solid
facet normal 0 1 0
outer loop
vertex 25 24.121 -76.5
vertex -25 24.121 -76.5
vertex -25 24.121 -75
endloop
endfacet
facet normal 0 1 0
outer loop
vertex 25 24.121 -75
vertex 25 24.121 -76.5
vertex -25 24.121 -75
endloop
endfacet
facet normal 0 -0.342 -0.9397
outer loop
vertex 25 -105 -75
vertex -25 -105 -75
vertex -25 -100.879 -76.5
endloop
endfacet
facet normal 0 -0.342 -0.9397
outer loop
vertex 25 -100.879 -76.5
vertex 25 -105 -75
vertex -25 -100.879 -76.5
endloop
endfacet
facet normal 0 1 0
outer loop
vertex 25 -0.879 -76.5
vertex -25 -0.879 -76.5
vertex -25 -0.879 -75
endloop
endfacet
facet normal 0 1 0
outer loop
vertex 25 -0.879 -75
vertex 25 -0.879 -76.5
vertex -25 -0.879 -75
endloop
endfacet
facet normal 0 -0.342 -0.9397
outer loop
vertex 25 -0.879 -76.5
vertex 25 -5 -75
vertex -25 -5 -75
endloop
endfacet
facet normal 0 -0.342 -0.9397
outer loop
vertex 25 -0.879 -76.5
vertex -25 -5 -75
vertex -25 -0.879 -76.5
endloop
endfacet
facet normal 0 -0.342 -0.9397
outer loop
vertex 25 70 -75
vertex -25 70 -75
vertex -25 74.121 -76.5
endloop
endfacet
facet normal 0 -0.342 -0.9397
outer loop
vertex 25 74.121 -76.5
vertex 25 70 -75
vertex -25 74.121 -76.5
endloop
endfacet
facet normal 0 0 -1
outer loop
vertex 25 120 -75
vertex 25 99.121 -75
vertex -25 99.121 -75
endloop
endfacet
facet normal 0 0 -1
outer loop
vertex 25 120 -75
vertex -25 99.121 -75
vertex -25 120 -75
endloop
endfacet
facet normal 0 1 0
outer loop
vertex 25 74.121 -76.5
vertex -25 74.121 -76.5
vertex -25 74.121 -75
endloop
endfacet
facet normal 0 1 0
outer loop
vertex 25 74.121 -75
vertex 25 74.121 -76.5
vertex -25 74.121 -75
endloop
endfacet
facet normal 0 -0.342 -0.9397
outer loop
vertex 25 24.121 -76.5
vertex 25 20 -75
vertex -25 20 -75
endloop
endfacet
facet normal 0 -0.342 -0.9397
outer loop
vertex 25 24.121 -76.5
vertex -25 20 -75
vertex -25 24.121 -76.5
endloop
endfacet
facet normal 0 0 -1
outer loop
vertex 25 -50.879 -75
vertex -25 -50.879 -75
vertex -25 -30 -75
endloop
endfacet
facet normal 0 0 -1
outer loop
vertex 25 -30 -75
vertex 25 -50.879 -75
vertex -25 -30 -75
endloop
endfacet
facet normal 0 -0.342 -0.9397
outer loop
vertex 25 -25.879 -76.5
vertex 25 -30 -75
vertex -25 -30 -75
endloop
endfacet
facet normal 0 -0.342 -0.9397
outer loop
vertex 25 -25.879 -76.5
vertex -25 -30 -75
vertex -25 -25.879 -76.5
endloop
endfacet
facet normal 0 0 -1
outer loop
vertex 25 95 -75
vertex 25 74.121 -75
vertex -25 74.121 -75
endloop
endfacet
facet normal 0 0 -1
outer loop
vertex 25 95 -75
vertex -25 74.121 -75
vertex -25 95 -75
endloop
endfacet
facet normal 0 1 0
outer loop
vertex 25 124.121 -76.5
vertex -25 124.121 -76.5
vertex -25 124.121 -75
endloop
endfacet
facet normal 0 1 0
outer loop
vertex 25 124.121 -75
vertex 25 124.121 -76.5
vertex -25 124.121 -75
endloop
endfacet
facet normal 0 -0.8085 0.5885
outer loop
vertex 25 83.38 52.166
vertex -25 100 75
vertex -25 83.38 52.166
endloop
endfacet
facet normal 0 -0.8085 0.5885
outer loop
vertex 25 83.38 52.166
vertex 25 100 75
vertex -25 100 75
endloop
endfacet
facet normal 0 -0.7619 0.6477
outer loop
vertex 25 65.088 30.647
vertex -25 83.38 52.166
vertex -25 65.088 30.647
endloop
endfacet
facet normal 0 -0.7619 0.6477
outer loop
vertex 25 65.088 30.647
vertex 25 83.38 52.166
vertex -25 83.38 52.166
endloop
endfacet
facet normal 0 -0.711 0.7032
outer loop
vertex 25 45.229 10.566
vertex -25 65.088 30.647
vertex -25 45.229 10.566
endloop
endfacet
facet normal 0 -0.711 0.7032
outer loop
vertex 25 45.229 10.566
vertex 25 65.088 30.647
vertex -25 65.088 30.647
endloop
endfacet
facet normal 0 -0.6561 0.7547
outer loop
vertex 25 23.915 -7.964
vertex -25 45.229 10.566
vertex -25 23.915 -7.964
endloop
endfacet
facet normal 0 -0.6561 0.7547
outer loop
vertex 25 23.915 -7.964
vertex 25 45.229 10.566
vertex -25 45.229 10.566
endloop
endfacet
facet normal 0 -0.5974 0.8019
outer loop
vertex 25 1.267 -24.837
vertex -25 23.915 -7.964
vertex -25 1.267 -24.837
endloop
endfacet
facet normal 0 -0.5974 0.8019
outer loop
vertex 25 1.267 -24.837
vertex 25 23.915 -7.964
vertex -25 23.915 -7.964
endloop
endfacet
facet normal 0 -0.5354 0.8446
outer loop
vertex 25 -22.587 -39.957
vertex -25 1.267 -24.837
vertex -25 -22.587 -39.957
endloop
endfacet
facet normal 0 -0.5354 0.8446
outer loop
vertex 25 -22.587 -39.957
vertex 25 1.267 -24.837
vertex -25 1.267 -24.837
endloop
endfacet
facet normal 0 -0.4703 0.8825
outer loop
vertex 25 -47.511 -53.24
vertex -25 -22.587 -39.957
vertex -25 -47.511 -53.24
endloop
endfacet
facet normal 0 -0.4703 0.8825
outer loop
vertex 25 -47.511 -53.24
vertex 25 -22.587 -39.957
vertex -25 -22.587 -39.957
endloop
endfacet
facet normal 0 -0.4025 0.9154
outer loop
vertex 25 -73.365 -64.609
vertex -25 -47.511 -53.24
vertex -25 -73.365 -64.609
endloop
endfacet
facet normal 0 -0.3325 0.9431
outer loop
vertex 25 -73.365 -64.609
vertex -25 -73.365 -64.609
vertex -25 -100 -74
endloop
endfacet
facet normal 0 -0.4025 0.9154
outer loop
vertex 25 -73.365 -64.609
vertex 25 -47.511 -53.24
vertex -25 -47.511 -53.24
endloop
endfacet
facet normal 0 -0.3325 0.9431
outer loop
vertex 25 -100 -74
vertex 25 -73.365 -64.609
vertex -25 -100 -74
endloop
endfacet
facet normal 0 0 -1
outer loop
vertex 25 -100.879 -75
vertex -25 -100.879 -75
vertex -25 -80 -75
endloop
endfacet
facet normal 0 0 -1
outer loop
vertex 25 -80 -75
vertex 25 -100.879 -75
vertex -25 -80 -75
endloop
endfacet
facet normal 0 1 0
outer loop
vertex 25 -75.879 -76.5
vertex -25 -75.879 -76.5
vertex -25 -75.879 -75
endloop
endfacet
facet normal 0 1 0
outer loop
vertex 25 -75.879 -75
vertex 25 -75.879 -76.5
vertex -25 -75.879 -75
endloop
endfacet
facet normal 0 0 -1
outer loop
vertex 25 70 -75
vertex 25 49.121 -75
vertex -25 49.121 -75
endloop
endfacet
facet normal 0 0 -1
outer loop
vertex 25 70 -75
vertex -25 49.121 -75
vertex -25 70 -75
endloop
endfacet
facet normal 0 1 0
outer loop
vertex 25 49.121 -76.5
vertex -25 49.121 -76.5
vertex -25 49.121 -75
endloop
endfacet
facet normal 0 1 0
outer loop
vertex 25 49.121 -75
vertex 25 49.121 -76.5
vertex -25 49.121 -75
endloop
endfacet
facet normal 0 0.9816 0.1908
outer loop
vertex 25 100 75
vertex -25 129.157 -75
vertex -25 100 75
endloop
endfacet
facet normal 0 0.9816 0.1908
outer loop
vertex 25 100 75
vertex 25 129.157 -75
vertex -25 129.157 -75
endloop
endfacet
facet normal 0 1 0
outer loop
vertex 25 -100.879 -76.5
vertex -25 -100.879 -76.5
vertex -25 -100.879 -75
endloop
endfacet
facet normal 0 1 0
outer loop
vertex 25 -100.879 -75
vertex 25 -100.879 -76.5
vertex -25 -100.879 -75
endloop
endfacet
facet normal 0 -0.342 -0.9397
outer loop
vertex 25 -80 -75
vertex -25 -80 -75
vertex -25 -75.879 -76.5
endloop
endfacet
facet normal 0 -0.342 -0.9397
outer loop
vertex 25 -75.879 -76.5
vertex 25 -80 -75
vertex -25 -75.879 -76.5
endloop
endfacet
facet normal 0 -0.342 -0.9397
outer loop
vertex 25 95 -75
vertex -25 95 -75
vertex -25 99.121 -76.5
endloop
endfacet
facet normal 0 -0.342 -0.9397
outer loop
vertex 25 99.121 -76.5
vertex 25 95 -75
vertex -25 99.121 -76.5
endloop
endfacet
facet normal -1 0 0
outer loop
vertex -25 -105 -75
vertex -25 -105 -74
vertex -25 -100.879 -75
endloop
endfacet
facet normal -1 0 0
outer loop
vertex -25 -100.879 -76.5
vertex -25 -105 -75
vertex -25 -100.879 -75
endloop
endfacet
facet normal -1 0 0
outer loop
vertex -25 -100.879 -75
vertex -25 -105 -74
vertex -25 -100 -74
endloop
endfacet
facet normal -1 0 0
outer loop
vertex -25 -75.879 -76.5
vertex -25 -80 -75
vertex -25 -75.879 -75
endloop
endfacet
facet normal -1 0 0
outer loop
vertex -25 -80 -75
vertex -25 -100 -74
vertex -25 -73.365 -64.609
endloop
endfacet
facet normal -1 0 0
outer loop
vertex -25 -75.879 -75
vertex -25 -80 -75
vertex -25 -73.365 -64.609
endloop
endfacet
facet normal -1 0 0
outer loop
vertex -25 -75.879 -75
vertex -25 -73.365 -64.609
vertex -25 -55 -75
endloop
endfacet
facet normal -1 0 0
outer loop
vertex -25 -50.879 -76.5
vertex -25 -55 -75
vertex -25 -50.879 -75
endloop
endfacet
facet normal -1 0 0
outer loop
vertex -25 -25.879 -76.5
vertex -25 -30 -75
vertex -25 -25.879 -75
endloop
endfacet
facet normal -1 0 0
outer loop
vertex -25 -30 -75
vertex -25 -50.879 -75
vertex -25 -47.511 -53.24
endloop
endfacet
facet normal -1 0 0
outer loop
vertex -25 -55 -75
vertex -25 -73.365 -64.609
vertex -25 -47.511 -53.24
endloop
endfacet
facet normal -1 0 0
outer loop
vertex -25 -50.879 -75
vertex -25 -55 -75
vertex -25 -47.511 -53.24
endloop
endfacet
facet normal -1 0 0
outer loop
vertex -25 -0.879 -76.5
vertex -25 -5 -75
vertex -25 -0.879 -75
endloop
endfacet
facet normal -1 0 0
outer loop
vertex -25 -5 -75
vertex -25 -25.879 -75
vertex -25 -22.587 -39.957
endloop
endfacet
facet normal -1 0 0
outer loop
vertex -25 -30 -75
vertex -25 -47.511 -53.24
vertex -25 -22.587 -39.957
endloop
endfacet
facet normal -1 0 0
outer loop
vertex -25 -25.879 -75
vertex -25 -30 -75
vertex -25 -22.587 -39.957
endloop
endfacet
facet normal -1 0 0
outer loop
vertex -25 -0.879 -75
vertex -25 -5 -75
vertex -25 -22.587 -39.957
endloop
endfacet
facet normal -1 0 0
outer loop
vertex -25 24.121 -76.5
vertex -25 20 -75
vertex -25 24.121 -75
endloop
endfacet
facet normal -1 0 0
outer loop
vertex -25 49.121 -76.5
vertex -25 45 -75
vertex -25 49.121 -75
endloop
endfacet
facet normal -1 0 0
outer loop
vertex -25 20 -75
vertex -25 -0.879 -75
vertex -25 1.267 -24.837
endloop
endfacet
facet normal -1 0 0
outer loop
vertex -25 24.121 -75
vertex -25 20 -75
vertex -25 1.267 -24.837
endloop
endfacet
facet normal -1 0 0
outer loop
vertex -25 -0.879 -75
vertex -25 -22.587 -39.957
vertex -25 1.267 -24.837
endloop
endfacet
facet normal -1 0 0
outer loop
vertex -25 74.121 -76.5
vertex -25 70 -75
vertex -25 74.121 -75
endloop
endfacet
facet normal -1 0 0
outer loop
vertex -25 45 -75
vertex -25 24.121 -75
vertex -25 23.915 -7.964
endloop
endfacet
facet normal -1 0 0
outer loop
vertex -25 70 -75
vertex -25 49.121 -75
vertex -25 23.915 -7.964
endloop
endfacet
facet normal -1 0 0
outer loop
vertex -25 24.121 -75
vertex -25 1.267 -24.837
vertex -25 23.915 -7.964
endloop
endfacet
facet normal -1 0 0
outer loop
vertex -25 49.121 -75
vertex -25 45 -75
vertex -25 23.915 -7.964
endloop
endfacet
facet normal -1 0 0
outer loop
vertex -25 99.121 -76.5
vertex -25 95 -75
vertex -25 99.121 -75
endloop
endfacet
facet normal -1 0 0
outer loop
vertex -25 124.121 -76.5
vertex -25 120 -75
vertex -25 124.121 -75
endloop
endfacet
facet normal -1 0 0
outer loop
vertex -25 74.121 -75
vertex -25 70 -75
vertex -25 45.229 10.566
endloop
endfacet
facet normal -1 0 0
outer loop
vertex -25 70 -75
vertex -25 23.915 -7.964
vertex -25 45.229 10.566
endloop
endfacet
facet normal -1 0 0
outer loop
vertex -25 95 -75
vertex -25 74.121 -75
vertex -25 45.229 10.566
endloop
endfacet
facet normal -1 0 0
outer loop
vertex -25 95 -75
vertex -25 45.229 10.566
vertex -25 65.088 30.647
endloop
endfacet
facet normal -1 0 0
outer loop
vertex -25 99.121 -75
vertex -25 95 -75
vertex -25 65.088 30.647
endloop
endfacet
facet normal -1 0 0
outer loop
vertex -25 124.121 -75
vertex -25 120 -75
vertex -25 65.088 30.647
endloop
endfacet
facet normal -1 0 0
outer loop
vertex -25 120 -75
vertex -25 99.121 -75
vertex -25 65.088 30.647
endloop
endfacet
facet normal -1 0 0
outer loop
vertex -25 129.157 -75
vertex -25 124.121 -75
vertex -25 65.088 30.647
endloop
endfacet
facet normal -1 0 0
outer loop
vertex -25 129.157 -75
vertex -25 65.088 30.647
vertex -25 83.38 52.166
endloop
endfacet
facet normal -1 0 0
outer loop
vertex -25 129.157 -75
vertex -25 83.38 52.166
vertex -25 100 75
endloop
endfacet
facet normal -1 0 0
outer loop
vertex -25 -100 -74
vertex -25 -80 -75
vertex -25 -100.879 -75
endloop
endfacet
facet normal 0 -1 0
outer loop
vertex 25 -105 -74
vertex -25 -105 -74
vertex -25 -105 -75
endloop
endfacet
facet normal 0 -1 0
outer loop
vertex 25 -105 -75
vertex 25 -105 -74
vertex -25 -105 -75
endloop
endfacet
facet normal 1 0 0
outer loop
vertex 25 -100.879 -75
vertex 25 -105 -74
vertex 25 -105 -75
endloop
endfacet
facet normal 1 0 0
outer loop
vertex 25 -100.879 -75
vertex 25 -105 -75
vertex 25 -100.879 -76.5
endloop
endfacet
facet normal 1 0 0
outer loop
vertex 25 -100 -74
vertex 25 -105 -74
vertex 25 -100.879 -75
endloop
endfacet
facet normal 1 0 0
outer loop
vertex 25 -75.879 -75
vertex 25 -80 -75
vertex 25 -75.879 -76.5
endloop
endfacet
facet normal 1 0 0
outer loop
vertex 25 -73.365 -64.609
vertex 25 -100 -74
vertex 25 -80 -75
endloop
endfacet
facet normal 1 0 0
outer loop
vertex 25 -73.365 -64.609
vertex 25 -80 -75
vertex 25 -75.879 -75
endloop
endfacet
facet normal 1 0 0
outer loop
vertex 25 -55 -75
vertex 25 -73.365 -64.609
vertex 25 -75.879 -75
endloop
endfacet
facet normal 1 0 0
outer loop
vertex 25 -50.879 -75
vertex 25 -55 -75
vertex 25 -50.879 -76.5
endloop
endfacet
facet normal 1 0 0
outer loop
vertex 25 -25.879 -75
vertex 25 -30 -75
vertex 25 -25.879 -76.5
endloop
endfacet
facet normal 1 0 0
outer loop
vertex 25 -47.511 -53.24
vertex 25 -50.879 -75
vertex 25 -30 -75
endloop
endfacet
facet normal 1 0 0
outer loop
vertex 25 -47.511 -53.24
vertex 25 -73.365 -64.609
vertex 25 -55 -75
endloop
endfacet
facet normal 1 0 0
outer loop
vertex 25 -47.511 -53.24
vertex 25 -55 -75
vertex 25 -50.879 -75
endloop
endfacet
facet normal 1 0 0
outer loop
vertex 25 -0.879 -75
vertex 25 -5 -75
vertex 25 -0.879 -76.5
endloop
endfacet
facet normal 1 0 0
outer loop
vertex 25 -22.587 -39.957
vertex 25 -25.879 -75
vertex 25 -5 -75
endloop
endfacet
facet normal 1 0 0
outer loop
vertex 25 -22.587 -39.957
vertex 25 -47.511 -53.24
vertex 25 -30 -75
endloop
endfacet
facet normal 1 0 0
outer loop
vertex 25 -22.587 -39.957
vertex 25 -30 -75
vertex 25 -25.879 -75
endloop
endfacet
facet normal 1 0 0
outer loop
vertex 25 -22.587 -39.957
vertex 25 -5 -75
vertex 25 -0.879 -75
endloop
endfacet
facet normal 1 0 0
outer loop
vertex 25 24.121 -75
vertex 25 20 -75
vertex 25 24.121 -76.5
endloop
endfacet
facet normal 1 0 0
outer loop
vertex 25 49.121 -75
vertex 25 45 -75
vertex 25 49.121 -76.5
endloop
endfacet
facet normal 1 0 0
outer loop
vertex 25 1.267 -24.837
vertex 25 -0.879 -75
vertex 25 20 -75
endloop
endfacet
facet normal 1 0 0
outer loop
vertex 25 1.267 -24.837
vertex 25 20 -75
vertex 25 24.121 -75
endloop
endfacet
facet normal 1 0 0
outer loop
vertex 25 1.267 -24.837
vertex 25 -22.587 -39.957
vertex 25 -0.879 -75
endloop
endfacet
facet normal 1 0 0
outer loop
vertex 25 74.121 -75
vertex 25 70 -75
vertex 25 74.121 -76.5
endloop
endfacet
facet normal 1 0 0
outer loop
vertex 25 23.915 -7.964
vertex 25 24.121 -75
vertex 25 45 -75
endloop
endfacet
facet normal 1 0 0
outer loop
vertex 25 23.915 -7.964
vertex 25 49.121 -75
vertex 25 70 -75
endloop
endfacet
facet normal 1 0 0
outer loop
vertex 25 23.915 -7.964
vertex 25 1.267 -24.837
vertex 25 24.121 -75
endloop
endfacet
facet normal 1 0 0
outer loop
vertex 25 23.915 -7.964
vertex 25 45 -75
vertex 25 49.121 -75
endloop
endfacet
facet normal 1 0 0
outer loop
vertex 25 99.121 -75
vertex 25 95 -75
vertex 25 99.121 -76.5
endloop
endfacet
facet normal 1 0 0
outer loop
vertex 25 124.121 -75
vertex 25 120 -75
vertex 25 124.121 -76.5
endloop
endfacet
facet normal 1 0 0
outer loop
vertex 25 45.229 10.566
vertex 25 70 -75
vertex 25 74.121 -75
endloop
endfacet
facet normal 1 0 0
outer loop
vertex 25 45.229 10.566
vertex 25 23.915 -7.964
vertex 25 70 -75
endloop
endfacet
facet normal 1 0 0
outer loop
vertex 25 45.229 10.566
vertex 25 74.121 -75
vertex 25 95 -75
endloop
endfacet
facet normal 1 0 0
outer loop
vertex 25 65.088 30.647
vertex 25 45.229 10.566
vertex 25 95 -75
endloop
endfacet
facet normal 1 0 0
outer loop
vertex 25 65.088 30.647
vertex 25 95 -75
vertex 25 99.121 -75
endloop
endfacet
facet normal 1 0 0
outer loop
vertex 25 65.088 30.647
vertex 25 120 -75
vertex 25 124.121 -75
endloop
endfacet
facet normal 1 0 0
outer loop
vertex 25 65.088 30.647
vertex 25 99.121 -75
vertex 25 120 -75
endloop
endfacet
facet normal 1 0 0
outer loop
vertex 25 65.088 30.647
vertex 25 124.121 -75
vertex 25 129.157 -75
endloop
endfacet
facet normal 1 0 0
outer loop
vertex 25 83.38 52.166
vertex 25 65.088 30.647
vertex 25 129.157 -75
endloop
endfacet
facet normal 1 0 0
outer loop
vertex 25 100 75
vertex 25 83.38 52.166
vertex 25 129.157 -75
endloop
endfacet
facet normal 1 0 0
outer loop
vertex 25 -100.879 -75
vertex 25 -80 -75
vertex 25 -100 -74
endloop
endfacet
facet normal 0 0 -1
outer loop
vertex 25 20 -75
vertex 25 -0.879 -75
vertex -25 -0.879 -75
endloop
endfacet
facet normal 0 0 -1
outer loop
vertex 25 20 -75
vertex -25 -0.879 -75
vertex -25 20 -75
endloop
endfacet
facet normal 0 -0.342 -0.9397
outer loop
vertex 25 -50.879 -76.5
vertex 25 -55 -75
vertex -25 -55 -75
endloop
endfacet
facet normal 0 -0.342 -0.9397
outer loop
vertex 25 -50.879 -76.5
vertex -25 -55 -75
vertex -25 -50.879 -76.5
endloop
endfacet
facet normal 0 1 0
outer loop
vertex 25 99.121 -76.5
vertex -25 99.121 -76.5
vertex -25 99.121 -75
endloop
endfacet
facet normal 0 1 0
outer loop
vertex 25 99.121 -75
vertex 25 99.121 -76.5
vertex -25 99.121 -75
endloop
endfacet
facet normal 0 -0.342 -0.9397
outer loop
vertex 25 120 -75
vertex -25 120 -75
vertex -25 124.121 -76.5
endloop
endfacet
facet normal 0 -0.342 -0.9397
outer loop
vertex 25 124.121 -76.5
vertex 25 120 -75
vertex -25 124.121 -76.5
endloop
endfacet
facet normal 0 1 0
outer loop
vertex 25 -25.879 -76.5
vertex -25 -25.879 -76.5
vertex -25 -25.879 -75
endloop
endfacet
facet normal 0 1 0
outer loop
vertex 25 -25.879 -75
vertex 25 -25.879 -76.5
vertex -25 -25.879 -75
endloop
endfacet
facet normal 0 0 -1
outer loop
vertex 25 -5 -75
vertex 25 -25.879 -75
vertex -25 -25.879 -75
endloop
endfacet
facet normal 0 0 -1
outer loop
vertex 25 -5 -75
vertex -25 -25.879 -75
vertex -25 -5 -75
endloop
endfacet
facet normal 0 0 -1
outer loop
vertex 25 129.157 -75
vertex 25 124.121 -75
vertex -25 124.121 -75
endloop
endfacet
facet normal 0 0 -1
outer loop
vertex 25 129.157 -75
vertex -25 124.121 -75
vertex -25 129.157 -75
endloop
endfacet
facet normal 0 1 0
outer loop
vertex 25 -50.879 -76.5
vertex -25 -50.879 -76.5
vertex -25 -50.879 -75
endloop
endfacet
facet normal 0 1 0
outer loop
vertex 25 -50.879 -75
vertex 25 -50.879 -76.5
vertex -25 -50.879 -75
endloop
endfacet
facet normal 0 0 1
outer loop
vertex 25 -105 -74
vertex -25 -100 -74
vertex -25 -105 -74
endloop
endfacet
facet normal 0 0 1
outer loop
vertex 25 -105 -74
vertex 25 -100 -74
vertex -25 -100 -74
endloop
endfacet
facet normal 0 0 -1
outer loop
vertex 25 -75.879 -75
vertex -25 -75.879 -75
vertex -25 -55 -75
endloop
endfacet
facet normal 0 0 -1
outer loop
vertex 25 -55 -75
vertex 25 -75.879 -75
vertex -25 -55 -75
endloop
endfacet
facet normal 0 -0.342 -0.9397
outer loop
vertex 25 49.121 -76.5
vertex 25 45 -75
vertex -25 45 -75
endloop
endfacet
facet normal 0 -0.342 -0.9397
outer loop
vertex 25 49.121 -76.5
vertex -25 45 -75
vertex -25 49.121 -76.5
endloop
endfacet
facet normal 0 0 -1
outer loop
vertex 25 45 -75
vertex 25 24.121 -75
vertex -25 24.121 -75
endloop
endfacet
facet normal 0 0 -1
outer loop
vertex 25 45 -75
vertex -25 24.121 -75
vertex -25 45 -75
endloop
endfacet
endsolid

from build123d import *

# Parameters (mm, degrees)
F1_DEPTH = 25


with BuildPart() as f1:
    # F0 (on Right) → F1 (new body, symmetric)
    with BuildSketch(Plane.YZ):
        Polygon((-100, -75), (-100, -74), (-105, -74), (-105, -75), (-100.8787838708, -75), align=None)
        with BuildLine():
            Line((100, -75), (100, 75))
            ThreePointArc((100, 75), (12.7497178819, -16.6137152777), (-100, -74))
            Line((-100, -74), (-100, -75))
            Line((-100, -75), (-80, -75))
            Line((-80, -75), (-75.8787838708, -75))
            Line((-75.8787838708, -75), (-55, -75))
            Line((-55, -75), (-50.8787838708, -75))
            Line((-50.8787838708, -75), (-30, -75))
            Line((-30, -75), (-25.8787838708, -75))
            Line((-25.8787838708, -75), (-5, -75))
            Line((-5, -75), (-0.8787838708, -75))
            Line((-0.8787838708, -75), (20, -75))
            Line((20, -75), (24.1212161292, -75))
            Line((24.1212161292, -75), (45, -75))
            Line((45, -75), (49.1212161292, -75))
            Line((49.1212161292, -75), (70, -75))
            Line((70, -75), (74.1212161292, -75))
            Line((74.1212161292, -75), (95, -75))
            Line((95, -75), (99.1212161292, -75))
            Line((99.1212161292, -75), (100, -75))
        make_face()
        Polygon((129.1570463707, -75), (100, 75), (100, -75), (120, -75), (124.1212161292, -75), align=None)
        Polygon((-100.8787838708, -75), (-105, -75), (-100.8787838708, -76.5), align=None)
        Polygon((-75.8787838708, -75), (-80, -75), (-75.8787838708, -76.5), align=None)
        Polygon((-50.8787838708, -75), (-55, -75), (-50.8787838708, -76.5), align=None)
        Polygon((-25.8787838708, -75), (-30, -75), (-25.8787838708, -76.5), align=None)
        Polygon((-0.8787838708, -75), (-5, -75), (-0.8787838708, -76.5), align=None)
        Polygon((24.1212161292, -76.5), (24.1212161292, -75), (20, -75), align=None)
        Polygon((49.1212161292, -76.5), (49.1212161292, -75), (45, -75), align=None)
        Polygon((74.1212161292, -76.5), (74.1212161292, -75), (70, -75), align=None)
        Polygon((99.1212161292, -76.5), (99.1212161292, -75), (95, -75), align=None)
        Polygon((124.1212161292, -75), (120, -75), (124.1212161292, -76.5), align=None)
    extrude(amount=F1_DEPTH, both=True)


solid = f1.part
